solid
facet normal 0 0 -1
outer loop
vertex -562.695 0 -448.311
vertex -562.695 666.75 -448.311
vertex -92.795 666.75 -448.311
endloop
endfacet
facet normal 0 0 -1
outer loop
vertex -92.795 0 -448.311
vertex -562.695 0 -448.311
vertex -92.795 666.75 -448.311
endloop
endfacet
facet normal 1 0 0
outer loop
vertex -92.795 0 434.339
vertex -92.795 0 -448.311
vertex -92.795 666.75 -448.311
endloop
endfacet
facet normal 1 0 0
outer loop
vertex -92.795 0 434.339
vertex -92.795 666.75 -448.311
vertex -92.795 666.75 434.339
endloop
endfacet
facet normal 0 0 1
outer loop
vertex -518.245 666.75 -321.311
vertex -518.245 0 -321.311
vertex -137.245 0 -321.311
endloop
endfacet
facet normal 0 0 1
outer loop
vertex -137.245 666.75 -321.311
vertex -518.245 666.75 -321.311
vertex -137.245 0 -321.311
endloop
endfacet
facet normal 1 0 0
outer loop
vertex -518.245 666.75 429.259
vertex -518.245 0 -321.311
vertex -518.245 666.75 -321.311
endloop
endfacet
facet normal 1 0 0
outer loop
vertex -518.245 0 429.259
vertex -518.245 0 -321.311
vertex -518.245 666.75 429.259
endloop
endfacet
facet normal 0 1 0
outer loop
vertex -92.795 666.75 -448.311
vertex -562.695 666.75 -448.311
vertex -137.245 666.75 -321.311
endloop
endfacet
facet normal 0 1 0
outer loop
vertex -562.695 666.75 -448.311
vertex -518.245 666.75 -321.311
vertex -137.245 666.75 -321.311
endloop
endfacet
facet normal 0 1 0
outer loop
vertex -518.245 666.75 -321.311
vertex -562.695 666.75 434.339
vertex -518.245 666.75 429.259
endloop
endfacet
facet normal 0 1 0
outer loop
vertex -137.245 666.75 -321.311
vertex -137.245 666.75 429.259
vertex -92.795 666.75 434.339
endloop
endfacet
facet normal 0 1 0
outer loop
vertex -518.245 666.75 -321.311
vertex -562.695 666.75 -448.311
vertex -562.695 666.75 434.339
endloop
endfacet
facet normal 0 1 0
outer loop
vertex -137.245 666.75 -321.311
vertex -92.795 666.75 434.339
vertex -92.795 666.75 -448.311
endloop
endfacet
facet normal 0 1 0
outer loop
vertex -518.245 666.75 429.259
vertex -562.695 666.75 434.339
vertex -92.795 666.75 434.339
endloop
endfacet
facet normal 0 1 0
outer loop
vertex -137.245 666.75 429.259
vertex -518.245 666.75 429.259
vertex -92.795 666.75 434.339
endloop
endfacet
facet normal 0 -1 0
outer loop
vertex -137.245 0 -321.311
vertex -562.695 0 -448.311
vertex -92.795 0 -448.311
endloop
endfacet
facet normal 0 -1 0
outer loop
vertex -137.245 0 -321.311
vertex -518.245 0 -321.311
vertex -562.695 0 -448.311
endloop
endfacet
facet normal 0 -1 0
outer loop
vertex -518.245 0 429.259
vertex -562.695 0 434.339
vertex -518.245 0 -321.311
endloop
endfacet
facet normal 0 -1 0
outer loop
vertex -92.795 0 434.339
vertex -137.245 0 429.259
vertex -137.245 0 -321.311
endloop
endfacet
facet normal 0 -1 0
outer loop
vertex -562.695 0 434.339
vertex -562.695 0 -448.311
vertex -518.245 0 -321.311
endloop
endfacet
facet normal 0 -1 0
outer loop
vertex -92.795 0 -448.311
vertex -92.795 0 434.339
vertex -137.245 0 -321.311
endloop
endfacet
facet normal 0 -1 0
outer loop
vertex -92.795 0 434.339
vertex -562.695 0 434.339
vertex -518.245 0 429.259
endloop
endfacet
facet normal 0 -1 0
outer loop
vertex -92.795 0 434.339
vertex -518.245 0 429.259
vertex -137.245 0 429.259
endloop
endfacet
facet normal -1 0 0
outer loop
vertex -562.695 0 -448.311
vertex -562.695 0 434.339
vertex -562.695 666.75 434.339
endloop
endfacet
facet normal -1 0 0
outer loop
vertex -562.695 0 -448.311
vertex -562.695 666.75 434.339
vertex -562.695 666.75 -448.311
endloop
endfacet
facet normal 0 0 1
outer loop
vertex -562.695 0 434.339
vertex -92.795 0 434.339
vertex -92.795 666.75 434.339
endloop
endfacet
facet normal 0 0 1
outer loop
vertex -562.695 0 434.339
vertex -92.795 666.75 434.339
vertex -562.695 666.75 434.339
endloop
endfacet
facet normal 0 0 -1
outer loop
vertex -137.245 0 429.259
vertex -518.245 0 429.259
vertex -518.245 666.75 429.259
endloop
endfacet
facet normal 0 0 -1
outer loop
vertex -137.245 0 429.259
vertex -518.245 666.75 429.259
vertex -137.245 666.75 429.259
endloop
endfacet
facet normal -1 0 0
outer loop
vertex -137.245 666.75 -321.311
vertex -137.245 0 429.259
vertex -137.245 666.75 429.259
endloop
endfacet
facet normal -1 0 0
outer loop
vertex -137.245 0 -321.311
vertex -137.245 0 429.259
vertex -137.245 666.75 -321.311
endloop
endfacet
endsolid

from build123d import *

# Parameters (mm, degrees)
F0_W     = 381
F0_H     = 127
F0_H_2   = 5.08
F1_DEPTH = 666.75


with BuildPart() as f1:
    # F0 (on Front) → F1 (new body)
    with BuildSketch(Plane.XZ):
        Polygon((-518.244692, 429.259082), (-518.244692, 434.339082), (-562.694692, 434.339082), (-562.694692, -448.310918), (-518.244692, -448.310918), (-518.244692, -321.310918), align=None)
        with Locations((-327.744692, -384.810918)):
            Rectangle(F0_W, F0_H)
        Polygon((-92.794692, 434.339082), (-137.244692, 434.339082), (-137.244692, 429.259082), (-137.244692, -321.310918), (-137.244692, -448.310918), (-92.794692, -448.310918), align=None)
        with Locations((-327.744692, 431.799082)):
            Rectangle(F0_W, F0_H_2)
    extrude(amount=-F1_DEPTH)


solid = f1.part
